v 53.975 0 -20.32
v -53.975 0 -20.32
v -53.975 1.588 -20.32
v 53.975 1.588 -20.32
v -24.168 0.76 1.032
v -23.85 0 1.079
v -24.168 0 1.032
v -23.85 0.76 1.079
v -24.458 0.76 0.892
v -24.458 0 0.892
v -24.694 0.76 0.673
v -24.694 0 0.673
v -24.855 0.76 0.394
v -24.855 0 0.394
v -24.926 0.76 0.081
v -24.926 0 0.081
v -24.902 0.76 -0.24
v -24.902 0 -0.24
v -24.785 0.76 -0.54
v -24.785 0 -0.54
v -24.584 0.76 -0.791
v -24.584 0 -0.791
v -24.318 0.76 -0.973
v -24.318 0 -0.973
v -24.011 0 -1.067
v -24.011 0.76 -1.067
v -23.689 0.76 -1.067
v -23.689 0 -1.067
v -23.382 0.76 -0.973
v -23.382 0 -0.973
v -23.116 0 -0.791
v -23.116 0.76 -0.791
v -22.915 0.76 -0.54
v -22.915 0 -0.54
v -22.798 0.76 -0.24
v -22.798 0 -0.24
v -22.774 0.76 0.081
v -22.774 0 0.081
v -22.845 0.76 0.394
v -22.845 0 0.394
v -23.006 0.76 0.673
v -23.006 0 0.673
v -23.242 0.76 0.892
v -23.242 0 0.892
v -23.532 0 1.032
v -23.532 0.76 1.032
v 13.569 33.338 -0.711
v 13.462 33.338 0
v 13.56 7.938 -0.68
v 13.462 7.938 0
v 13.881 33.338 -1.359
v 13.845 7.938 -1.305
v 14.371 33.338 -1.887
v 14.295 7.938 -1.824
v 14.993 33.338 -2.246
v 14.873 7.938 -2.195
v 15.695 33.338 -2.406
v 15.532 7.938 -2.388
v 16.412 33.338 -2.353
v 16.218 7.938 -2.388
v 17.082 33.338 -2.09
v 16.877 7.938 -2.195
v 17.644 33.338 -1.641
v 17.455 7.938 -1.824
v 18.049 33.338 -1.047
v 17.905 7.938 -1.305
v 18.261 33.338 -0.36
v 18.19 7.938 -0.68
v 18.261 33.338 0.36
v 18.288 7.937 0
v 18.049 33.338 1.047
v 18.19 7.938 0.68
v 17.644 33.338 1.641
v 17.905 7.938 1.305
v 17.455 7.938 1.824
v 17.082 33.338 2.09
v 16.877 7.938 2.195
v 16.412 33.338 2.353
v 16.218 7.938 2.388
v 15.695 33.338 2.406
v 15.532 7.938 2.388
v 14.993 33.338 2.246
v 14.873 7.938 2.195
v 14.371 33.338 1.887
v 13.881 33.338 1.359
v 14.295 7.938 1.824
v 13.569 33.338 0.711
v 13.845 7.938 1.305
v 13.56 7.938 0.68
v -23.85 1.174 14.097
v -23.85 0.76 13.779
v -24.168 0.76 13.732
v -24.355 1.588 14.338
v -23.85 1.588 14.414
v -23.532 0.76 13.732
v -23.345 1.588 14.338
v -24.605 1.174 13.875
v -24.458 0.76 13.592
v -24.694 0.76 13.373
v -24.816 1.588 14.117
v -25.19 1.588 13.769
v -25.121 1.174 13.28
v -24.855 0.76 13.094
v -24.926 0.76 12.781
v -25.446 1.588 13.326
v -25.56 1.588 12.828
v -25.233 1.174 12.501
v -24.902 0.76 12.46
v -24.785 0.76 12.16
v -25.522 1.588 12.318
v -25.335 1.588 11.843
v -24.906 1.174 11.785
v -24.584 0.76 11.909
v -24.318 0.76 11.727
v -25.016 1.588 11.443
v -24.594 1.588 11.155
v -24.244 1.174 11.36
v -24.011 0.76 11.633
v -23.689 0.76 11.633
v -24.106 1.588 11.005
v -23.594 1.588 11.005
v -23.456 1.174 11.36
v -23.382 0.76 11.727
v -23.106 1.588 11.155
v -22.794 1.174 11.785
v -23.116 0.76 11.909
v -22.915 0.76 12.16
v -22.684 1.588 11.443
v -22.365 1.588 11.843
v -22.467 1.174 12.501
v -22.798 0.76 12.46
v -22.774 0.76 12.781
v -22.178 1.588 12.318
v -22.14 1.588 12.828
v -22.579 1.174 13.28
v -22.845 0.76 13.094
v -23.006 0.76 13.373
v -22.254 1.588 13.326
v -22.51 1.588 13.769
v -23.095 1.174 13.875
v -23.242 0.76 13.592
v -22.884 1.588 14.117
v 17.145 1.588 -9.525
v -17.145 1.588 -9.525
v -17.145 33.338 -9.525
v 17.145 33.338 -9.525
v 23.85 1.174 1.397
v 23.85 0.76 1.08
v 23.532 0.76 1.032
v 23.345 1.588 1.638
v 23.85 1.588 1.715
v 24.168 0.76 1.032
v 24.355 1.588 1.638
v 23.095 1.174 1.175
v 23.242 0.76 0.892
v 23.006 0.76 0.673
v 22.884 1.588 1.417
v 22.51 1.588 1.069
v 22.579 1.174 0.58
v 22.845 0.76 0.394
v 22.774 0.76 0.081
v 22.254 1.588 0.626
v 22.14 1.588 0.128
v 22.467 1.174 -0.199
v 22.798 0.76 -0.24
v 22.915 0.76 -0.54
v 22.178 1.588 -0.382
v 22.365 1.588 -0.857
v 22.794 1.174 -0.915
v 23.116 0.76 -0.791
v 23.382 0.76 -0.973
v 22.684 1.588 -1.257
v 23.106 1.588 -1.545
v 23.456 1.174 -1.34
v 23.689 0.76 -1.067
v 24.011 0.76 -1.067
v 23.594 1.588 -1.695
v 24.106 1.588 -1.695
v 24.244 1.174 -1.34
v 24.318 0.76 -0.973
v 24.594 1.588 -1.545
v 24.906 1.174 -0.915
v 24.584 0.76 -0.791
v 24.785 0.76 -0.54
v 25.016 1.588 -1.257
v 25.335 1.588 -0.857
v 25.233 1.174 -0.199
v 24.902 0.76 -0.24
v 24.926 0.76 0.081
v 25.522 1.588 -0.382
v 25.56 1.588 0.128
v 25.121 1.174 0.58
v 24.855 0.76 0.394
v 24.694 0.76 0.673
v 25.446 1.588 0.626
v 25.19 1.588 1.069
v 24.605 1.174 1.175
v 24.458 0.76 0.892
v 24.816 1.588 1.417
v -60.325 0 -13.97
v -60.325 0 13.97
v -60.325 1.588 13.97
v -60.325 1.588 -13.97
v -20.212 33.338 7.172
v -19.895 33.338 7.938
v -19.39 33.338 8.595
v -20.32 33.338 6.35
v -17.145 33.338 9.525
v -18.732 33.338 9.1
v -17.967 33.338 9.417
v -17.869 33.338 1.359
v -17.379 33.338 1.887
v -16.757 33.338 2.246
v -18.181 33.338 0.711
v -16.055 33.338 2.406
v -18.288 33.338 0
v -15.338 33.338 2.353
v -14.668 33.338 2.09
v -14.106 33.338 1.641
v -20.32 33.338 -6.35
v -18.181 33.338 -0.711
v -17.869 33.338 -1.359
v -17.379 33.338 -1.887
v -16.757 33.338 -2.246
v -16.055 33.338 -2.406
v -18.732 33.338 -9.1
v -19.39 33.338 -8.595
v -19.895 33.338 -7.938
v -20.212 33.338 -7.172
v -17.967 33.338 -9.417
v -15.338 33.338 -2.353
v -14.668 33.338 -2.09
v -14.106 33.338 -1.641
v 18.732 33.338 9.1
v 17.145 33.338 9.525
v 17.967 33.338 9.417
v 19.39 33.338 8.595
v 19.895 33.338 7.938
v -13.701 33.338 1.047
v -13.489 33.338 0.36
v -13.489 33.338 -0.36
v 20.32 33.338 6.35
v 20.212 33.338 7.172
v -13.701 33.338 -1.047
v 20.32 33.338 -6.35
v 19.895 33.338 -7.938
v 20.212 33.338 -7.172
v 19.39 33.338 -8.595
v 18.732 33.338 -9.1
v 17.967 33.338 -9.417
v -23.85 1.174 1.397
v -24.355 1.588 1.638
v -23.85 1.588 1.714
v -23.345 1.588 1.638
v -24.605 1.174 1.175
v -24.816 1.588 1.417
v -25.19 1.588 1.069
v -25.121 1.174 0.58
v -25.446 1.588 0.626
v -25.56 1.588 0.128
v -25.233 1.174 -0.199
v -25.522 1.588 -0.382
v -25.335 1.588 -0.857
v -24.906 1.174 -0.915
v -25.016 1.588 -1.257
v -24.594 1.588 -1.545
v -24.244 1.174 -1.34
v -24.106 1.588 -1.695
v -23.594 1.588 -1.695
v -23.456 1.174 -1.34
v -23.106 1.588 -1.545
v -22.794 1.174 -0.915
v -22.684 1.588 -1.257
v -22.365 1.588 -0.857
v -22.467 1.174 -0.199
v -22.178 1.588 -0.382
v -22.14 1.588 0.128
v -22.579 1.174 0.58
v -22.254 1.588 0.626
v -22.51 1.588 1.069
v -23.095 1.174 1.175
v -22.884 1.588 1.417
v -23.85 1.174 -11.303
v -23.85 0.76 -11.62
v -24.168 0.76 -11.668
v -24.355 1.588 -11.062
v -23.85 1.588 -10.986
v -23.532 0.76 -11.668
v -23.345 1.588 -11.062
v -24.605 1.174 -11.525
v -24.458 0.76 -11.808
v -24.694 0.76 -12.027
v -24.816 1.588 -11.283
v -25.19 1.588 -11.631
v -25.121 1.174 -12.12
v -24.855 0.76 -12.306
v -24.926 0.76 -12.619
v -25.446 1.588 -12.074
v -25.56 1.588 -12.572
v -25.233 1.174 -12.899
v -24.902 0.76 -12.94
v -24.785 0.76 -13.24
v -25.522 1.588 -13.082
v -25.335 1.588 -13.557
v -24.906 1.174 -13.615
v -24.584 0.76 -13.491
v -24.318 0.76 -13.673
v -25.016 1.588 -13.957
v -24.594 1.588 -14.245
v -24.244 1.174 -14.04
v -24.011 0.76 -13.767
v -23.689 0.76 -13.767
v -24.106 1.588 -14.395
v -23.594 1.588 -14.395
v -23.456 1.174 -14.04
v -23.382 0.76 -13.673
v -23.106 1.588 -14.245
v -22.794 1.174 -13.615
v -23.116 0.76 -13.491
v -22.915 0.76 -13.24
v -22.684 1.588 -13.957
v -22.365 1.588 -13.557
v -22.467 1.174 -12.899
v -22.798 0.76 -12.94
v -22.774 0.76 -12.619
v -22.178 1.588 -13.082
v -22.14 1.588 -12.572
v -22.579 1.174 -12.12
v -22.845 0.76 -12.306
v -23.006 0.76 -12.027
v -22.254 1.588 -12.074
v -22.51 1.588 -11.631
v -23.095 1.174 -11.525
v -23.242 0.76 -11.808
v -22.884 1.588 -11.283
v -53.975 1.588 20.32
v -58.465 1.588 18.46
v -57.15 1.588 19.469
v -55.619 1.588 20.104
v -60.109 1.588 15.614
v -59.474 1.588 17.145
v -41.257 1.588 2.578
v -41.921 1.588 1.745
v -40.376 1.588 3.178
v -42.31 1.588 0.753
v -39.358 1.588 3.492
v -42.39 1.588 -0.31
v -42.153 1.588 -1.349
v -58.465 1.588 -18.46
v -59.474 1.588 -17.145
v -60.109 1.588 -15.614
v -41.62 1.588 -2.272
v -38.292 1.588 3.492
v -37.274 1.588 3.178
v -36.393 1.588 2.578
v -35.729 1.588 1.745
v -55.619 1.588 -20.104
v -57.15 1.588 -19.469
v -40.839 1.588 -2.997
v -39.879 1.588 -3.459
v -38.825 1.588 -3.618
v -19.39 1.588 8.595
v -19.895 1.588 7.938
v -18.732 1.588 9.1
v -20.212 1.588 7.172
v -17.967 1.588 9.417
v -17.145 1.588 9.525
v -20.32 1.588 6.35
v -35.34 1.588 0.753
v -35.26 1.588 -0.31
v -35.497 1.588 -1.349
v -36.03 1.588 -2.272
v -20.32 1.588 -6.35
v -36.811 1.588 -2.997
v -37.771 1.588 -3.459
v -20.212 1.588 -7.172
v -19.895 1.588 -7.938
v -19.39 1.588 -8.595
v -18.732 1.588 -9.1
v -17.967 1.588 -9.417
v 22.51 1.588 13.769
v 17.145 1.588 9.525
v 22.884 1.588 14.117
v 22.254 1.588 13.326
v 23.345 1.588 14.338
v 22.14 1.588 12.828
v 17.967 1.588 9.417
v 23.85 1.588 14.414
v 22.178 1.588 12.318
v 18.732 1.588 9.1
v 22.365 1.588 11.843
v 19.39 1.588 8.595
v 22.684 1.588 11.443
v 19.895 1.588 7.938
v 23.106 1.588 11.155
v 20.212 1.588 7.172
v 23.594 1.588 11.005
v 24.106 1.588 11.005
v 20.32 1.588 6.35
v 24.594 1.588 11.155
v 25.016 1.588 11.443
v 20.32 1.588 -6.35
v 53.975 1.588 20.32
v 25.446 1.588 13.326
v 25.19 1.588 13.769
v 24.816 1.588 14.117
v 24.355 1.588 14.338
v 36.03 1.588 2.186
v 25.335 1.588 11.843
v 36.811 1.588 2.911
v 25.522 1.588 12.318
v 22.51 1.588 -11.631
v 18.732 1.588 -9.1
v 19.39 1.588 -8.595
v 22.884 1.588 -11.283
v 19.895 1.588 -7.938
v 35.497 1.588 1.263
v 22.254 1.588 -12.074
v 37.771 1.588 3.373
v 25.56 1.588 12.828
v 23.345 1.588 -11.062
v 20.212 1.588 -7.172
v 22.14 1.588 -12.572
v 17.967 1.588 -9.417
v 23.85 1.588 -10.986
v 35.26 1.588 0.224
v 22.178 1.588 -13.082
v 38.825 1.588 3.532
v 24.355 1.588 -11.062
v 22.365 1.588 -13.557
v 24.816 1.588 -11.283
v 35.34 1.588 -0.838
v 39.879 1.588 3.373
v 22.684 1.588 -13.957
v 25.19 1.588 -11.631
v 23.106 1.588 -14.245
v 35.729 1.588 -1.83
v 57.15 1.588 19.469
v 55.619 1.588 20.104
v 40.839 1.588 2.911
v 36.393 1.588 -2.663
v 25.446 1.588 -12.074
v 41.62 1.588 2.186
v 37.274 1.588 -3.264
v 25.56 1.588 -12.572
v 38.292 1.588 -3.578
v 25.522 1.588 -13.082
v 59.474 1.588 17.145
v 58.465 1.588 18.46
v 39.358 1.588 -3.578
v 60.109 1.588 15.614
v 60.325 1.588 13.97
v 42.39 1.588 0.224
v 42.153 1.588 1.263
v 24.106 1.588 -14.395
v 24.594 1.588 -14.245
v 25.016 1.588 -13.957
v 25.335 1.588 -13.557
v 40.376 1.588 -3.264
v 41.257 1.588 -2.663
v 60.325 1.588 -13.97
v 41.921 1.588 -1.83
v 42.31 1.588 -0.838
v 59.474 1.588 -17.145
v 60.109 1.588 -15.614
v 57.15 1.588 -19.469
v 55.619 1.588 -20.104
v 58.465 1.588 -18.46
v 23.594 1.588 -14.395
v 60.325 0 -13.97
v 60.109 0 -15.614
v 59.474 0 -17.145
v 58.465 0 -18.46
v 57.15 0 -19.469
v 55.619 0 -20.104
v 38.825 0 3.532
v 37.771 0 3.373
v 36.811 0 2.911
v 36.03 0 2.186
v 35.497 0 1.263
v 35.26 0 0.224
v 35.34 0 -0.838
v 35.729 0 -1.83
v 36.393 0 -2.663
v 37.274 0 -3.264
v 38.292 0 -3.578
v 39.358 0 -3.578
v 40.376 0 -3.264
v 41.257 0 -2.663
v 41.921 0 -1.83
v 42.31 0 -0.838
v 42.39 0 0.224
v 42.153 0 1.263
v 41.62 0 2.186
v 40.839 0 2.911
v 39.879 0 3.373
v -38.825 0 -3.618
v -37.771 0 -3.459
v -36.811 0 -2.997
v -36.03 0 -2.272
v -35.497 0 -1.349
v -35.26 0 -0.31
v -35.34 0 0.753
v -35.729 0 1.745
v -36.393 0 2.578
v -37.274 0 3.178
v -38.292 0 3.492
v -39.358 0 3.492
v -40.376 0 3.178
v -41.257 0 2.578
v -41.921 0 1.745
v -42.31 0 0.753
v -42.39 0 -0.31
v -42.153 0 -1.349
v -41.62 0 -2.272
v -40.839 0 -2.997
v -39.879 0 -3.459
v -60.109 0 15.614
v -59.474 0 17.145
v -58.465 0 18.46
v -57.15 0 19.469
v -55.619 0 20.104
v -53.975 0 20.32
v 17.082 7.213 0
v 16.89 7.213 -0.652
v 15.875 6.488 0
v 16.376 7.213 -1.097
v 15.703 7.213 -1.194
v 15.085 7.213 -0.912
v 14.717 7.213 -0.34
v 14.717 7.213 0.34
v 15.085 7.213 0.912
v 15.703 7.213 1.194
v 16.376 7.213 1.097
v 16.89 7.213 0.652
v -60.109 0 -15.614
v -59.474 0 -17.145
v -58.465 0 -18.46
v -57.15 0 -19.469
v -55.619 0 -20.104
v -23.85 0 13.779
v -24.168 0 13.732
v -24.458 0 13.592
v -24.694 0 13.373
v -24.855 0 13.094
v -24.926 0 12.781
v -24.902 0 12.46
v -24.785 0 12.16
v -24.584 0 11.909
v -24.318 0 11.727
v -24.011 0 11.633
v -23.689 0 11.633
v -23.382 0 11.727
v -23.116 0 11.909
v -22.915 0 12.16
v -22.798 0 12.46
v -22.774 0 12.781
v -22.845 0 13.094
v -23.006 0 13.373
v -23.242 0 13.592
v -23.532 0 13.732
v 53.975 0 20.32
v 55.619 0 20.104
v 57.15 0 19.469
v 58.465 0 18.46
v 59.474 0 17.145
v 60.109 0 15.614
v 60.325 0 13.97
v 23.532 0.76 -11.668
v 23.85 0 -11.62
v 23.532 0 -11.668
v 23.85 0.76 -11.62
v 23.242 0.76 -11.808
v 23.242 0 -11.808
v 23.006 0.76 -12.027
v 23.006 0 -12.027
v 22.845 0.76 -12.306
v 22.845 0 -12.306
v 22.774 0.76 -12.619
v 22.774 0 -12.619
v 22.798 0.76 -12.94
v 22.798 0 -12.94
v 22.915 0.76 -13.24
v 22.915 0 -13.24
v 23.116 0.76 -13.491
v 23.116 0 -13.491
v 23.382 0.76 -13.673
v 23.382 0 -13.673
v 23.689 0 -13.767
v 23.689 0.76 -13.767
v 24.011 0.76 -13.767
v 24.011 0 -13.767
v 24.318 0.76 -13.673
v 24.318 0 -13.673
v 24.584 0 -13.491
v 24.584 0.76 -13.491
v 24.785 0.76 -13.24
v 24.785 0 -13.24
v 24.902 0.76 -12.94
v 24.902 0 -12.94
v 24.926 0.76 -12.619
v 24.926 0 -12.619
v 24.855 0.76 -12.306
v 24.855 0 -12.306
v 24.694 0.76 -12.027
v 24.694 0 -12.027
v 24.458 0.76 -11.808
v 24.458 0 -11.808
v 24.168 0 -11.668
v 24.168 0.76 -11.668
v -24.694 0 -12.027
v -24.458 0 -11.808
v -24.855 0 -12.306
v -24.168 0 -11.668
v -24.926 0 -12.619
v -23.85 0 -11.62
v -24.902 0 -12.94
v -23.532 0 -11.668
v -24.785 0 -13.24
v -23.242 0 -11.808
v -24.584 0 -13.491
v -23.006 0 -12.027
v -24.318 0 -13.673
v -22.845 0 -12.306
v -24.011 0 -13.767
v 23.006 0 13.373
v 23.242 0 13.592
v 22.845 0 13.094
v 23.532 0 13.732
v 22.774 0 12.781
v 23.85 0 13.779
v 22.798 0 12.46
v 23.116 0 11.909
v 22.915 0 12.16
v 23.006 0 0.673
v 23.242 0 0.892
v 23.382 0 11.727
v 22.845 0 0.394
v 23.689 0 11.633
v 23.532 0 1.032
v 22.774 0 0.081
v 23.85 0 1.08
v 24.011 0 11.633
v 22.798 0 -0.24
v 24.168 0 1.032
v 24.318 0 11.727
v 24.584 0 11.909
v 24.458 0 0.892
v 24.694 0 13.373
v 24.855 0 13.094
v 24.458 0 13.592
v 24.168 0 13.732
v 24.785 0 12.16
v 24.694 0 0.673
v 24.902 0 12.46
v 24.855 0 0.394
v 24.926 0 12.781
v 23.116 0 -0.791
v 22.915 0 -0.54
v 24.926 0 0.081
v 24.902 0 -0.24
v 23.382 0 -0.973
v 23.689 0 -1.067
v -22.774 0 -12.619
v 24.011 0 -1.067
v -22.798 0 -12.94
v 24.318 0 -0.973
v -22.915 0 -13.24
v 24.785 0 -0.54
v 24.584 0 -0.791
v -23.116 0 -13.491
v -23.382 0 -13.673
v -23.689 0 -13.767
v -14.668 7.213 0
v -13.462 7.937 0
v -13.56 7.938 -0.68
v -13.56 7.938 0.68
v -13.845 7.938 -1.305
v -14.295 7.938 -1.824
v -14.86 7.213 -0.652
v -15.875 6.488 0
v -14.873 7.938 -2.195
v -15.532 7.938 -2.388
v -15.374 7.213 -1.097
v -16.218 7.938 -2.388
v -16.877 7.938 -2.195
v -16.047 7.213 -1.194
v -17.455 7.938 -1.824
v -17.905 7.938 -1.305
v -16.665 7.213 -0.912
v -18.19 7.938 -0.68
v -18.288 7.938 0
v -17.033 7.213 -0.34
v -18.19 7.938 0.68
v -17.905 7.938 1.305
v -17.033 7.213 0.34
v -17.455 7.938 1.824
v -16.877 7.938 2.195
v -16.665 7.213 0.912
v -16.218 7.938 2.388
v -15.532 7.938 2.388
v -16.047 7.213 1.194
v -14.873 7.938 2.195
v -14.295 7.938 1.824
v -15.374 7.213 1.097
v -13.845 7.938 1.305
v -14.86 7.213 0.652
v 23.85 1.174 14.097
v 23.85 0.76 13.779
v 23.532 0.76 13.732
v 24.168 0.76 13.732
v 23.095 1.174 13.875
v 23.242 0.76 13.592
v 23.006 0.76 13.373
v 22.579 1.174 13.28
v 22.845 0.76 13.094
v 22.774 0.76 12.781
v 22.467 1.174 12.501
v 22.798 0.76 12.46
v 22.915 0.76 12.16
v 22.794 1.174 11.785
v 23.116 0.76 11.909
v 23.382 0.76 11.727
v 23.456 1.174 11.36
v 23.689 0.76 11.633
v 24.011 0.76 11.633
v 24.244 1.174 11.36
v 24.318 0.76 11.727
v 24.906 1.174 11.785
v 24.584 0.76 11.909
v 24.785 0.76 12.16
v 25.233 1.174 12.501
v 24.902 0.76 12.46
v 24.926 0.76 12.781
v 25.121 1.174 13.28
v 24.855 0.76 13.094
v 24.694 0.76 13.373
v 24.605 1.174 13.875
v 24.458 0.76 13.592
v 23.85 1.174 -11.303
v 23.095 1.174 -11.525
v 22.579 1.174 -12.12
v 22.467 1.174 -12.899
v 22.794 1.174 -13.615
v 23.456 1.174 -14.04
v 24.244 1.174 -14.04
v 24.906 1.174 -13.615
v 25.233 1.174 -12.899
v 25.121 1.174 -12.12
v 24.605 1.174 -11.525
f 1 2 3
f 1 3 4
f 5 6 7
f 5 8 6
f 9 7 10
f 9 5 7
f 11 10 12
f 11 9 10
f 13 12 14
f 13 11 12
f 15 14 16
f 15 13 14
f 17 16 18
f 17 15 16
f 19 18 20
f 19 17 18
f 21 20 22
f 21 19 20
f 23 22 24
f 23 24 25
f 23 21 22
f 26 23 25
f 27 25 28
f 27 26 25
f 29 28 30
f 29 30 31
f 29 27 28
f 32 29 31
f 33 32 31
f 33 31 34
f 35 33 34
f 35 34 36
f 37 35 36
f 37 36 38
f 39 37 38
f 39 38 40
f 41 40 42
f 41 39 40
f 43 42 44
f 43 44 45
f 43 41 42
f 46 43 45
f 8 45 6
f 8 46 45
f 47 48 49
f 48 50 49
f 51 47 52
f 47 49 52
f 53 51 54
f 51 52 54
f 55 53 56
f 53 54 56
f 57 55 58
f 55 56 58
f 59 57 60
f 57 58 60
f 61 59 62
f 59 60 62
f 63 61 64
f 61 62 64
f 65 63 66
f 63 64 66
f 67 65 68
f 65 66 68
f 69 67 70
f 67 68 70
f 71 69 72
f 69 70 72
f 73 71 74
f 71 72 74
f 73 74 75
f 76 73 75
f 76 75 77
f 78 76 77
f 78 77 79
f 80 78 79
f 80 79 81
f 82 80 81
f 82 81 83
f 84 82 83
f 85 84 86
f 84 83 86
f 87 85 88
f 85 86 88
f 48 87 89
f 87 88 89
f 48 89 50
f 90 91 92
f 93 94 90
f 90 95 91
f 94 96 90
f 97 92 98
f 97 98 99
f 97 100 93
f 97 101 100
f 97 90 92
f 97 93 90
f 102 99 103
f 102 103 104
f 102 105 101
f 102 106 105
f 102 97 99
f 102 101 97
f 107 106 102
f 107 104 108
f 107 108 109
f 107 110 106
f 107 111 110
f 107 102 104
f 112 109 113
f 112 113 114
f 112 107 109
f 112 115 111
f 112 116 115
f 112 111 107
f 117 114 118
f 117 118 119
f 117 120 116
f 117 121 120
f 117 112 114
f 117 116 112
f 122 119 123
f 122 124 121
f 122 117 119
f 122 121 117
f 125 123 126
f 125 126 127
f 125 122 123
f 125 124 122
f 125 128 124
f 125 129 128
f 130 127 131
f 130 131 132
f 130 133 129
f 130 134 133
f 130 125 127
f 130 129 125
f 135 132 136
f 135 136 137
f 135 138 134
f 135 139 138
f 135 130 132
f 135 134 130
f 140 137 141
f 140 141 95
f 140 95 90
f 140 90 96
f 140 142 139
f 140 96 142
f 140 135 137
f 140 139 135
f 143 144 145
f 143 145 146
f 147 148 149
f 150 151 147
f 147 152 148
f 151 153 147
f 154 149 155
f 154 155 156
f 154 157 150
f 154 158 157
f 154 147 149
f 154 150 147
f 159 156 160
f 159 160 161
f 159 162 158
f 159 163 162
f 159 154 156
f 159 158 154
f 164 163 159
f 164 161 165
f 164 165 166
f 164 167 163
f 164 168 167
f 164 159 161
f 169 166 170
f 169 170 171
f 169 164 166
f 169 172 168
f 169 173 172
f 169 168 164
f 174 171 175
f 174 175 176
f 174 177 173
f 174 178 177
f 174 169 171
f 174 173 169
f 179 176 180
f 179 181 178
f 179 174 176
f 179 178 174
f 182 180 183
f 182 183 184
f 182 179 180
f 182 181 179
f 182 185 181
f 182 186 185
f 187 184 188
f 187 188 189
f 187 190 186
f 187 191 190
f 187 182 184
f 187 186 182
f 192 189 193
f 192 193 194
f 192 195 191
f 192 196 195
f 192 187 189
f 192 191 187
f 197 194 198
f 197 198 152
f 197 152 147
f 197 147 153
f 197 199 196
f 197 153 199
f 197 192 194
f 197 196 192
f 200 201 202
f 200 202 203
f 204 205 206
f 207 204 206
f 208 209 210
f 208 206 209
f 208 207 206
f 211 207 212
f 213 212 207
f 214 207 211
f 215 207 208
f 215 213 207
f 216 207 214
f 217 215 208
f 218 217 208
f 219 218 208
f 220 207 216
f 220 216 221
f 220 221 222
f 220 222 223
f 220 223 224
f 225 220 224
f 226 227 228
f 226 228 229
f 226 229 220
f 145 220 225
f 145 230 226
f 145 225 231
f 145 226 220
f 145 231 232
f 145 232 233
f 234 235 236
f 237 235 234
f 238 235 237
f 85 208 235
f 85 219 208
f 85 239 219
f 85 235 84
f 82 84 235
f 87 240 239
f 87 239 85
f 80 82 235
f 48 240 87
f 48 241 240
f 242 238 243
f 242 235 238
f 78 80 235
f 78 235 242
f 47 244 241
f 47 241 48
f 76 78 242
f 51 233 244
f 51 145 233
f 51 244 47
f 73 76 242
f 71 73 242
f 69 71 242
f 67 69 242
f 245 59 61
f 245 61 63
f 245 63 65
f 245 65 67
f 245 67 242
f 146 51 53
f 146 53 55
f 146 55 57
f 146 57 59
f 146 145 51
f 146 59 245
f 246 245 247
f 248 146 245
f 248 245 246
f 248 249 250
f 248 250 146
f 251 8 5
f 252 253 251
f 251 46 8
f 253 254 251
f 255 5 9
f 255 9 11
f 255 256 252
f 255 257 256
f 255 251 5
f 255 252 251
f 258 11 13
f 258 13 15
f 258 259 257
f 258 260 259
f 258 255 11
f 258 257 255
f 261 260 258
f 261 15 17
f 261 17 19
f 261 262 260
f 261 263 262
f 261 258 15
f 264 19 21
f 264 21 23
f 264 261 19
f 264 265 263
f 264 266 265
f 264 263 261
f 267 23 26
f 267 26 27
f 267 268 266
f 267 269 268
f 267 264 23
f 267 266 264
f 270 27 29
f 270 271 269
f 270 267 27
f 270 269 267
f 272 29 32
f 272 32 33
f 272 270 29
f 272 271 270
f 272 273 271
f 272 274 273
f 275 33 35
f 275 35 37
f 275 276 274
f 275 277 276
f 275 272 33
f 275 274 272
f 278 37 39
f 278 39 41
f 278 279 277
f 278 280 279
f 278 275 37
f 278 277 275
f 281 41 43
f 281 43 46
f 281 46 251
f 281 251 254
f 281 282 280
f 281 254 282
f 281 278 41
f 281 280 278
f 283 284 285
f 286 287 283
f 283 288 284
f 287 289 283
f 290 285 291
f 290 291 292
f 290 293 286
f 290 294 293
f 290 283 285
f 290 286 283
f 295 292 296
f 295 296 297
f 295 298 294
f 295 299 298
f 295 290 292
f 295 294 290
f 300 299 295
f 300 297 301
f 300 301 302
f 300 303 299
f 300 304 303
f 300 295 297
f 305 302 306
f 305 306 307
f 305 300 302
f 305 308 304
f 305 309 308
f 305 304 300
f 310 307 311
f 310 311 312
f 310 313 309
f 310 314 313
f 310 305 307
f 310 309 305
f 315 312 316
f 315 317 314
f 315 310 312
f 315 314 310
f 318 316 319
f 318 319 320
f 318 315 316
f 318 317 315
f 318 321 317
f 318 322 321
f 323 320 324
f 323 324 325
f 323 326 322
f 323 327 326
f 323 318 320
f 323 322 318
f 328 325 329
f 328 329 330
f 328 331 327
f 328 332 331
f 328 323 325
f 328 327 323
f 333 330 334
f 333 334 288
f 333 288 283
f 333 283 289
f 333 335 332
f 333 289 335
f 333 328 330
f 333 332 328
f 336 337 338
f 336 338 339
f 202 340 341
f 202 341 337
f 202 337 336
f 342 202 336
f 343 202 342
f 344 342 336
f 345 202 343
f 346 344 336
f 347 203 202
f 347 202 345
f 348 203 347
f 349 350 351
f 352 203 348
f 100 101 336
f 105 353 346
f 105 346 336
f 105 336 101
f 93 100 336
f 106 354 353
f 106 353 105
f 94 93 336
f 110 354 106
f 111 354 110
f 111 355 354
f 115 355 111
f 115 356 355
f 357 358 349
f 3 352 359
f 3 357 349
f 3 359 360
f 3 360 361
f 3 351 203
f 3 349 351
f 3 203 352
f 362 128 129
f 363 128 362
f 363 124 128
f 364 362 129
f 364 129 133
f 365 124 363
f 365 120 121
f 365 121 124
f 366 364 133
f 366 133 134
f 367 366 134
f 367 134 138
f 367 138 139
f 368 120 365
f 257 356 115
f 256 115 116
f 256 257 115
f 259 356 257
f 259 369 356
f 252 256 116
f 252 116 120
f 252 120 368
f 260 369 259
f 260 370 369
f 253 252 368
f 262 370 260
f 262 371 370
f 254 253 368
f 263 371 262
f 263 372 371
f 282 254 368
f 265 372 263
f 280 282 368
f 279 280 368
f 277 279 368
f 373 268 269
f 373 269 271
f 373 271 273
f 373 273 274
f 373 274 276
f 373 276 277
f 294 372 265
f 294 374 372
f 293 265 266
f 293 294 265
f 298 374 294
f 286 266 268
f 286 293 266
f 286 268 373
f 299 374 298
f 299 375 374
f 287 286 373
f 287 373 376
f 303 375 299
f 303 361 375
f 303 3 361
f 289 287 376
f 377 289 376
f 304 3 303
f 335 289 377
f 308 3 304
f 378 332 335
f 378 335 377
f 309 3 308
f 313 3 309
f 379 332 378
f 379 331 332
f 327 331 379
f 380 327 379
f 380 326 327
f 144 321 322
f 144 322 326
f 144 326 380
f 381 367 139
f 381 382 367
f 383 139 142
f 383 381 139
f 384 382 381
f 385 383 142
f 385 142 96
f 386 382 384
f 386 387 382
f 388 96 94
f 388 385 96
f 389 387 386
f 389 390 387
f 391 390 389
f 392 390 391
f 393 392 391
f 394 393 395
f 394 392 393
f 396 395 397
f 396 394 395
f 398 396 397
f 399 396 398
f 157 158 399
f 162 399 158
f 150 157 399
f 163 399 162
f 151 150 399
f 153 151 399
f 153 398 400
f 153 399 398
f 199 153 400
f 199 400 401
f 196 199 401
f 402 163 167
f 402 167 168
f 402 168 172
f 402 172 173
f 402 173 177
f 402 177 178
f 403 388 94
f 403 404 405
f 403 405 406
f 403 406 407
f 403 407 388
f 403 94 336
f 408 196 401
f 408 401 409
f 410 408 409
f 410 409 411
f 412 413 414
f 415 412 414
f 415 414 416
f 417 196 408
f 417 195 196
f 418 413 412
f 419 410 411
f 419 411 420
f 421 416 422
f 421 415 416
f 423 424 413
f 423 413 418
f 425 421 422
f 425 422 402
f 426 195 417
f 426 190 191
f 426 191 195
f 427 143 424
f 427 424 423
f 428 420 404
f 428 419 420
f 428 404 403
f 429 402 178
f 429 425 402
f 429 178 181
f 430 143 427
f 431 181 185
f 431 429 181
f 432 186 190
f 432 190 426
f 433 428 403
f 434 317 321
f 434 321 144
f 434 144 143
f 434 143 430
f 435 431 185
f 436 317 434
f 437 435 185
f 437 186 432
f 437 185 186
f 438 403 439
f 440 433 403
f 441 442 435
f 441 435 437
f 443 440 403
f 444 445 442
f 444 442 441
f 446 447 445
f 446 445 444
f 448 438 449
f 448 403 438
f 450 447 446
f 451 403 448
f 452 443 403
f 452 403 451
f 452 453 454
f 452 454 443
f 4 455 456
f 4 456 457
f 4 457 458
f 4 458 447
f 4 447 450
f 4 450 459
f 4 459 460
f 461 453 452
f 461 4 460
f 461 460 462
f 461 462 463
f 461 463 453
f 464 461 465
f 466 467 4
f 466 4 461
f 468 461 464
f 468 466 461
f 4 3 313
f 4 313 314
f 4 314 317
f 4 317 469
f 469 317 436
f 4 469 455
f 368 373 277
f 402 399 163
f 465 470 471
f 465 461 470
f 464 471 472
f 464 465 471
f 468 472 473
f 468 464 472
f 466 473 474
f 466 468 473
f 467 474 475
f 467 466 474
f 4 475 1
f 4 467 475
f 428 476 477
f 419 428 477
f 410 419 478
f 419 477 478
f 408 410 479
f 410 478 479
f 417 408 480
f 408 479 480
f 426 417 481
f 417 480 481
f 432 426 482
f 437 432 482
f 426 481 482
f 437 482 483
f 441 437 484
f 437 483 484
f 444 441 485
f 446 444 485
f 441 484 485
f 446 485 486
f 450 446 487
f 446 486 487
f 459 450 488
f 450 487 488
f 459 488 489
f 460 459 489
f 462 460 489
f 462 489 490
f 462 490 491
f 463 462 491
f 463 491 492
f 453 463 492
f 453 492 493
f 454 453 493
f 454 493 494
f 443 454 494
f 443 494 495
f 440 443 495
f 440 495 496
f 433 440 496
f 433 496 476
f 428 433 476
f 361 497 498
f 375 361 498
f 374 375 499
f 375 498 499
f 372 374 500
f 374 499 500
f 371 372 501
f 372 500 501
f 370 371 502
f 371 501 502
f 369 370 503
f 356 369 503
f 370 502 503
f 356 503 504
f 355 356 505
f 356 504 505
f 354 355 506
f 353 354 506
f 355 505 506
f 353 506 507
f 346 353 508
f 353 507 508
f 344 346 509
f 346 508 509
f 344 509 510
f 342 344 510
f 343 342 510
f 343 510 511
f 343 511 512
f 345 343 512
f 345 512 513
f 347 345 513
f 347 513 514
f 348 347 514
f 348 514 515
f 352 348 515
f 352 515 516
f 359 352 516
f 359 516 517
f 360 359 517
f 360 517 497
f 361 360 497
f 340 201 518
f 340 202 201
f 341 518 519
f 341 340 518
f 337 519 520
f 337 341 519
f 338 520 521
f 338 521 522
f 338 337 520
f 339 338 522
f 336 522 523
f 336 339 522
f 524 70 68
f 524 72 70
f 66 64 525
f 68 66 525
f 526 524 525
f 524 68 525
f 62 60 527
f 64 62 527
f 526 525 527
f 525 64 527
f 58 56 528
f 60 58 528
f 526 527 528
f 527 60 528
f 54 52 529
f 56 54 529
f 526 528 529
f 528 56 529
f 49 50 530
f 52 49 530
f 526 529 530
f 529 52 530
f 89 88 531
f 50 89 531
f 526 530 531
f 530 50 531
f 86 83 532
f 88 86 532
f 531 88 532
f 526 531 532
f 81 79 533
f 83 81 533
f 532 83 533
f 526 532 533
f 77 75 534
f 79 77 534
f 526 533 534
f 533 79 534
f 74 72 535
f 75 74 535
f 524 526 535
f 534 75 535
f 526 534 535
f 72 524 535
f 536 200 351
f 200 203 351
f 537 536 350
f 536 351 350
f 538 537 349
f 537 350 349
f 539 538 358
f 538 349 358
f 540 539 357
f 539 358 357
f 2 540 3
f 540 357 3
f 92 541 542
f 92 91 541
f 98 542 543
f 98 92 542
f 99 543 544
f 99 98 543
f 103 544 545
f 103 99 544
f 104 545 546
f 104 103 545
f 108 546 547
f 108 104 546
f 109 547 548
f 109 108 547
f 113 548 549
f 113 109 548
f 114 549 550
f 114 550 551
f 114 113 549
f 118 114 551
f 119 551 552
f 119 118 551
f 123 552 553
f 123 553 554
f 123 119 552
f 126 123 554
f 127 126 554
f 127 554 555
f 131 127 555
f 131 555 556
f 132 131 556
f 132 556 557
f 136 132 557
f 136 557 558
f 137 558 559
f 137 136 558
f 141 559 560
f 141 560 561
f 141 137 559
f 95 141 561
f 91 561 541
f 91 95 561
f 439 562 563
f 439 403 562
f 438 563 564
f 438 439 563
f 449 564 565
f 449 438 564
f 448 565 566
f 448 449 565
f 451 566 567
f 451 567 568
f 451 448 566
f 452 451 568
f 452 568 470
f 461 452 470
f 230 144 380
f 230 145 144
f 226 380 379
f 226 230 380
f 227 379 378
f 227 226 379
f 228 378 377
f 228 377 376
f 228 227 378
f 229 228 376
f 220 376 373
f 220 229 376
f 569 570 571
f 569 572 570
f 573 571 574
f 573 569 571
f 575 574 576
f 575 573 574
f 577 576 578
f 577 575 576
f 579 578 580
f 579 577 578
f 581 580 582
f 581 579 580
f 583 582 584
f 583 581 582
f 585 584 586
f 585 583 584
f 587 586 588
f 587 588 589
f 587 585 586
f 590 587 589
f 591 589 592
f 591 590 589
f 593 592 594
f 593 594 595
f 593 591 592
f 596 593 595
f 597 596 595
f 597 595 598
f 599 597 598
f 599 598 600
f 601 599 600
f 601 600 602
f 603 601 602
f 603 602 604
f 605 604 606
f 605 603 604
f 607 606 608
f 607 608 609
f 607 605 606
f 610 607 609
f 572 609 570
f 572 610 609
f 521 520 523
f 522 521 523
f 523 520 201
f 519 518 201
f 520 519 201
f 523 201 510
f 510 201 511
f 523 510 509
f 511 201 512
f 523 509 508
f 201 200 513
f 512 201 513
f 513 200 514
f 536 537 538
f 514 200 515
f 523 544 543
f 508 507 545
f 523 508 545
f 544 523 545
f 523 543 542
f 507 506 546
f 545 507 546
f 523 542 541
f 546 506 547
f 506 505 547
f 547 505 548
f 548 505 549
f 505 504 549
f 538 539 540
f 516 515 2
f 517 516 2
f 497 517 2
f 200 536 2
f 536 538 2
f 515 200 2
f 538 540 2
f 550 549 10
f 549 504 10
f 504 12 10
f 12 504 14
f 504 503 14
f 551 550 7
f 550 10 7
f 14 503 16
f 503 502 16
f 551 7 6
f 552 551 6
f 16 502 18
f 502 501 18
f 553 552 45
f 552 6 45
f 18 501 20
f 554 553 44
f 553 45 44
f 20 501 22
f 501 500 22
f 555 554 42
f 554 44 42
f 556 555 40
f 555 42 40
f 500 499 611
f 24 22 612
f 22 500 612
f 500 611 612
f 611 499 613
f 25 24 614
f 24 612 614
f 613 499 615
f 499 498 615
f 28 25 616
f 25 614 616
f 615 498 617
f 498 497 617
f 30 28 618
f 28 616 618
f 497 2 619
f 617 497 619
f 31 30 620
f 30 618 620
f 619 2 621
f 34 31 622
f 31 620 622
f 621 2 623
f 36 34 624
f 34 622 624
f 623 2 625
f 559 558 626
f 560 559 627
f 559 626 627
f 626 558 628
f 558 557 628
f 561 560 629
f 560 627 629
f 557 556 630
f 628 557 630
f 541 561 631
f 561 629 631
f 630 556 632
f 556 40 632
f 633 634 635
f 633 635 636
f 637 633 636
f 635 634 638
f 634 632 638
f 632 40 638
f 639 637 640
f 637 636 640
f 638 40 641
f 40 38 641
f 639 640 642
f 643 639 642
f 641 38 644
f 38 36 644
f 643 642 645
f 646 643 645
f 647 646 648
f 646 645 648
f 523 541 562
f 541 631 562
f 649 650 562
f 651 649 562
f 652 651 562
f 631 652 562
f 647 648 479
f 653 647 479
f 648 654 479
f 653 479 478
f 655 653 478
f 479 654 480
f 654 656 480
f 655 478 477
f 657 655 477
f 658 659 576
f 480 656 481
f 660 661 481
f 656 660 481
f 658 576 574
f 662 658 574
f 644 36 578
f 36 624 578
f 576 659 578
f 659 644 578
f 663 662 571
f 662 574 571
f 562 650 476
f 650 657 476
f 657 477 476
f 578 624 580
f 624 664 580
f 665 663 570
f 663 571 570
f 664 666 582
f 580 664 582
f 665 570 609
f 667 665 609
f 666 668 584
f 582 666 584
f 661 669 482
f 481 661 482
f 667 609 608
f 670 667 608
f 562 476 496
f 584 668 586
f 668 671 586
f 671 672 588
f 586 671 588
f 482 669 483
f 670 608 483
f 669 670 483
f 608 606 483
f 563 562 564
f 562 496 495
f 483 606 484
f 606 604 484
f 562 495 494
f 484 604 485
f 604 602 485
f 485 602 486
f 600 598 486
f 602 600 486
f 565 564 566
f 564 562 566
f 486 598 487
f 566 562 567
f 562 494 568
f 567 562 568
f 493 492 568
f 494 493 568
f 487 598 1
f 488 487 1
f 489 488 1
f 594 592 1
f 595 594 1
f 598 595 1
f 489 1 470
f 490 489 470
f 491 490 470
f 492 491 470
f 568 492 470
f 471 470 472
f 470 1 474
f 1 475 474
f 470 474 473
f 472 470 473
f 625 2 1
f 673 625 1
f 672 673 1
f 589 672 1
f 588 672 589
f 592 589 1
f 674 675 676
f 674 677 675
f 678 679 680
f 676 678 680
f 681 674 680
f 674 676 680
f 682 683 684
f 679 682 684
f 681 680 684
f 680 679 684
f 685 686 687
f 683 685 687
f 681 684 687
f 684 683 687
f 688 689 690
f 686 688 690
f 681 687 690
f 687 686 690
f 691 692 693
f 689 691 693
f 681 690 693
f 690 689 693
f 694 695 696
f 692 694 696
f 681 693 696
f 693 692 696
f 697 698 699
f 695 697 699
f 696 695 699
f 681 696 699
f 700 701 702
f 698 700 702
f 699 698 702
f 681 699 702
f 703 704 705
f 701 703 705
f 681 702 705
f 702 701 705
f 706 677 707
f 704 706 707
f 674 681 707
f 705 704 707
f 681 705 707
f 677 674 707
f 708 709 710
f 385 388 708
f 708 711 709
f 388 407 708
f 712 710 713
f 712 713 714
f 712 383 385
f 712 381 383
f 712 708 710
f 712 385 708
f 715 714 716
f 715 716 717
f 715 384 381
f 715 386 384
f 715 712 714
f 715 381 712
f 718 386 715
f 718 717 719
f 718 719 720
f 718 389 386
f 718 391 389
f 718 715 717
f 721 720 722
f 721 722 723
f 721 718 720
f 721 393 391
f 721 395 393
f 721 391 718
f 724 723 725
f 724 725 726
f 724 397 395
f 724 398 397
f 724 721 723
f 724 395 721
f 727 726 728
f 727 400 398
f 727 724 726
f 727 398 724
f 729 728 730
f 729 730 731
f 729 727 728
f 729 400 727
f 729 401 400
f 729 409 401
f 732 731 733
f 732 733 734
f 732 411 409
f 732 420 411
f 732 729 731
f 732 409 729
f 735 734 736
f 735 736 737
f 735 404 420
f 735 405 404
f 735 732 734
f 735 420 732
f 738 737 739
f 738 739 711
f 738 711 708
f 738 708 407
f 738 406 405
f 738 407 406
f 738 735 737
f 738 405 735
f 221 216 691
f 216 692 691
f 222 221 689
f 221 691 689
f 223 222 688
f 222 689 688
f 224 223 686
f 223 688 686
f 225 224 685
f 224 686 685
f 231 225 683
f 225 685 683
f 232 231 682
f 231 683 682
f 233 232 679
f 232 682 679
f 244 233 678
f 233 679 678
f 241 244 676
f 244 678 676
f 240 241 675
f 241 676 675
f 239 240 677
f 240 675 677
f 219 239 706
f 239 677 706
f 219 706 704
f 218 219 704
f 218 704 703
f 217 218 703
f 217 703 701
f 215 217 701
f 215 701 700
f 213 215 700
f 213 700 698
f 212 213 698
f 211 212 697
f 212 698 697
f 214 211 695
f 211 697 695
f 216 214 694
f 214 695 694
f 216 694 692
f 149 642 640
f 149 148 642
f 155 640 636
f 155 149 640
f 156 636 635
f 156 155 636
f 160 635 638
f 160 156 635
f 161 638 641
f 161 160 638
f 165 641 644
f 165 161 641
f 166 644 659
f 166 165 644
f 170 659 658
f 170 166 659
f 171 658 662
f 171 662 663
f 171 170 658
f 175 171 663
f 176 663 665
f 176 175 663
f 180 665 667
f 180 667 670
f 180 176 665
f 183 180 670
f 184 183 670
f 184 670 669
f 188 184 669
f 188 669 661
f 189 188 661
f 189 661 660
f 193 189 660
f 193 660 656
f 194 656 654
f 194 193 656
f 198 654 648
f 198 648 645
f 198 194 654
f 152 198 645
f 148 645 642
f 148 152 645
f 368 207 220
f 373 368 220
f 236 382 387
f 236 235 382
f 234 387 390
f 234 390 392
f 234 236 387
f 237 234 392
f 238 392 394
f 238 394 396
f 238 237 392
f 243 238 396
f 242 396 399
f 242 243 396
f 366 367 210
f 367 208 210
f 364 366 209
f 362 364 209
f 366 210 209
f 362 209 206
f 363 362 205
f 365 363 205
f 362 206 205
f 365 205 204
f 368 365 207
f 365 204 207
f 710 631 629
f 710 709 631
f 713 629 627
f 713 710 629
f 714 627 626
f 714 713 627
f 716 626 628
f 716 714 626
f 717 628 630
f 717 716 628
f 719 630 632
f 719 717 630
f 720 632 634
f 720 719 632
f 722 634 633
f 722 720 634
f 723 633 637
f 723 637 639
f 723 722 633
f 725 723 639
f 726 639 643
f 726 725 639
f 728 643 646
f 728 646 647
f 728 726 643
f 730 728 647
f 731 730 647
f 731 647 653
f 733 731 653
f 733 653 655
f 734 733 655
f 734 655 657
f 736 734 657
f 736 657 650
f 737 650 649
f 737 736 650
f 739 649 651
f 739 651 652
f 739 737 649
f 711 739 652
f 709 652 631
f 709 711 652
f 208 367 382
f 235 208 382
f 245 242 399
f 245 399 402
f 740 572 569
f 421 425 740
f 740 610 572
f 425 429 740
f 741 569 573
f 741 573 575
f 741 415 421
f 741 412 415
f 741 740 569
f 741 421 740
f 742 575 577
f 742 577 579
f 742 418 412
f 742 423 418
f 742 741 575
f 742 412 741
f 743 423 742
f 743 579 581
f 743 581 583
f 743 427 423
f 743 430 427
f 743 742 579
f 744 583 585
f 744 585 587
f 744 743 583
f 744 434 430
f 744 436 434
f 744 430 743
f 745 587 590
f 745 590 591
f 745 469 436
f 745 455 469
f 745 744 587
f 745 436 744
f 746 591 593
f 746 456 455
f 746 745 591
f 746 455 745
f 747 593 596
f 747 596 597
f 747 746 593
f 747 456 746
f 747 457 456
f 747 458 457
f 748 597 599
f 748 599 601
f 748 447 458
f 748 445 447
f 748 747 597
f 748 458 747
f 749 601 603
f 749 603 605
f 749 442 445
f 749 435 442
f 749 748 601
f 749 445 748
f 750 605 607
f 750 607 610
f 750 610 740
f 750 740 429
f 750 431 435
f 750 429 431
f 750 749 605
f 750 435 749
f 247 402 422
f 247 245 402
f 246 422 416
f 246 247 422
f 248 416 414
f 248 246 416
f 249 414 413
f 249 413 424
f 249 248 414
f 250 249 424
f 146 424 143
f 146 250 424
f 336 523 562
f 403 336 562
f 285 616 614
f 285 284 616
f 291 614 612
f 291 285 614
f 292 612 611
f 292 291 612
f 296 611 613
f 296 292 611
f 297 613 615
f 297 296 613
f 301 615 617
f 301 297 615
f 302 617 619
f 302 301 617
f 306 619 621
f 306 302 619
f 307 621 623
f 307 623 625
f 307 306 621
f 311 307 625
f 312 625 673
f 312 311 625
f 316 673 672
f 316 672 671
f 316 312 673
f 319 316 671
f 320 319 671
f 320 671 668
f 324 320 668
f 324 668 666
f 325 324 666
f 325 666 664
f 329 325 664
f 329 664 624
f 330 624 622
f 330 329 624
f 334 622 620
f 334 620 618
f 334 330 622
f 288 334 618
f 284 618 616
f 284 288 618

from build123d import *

# Parameters (mm, degrees)
SKETCH1_W                      = 120.65
SKETCH1_H                      = 40.64
BOSS_EXTRUDE1_DEPTH            = 1.5875
FILLET1_R                      = 6.35
SKETCH2_W                      = 40.64
SKETCH2_H                      = 19.05
BOSS_EXTRUDE2_DEPTH            = 31.75
FILLET2_R                      = 3.175
F_10_CLEARANCE_HOLE1_D         = 4.826
F_10_CLEARANCE_HOLE1_DEPTH     = 25.4
F_10_CLEARANCE_HOLE1_TIP       = 1.449876674
F_2_CLEARANCE_HOLE1_AT_2_COUNT = 2
F_2_CLEARANCE_HOLE1_AT_2_PITCH = 12.7
F_2_CLEARANCE_HOLE1_AT_3_COUNT = 2
F_2_CLEARANCE_HOLE1_AT_3_PITCH = 25.4
F_2_CLEARANCE_HOLE1_AT_4_COUNT = 2
F_2_CLEARANCE_HOLE1_AT_4_PITCH = 54.041188126
F_2_CLEARANCE_HOLE1_AT_5_COUNT = 2
F_2_CLEARANCE_HOLE1_AT_5_PITCH = 49.361726207
F_2_CLEARANCE_HOLE1_AT_6_COUNT = 2
F_2_CLEARANCE_HOLE1_AT_6_PITCH = 47.700000148
SKETCH13_R                     = 3.5749992
CUT_EXTRUDE1_DEPTH             = 72.856780691


with BuildPart() as part:
    # Sketch1 → Boss-Extrude1 (new body)
    with BuildSketch(Plane(origin=(0, 0, 0), x_dir=(1, 0, 0), z_dir=(0, 1, 0))):
        Rectangle(SKETCH1_W, SKETCH1_H)
    extrude(amount=BOSS_EXTRUDE1_DEPTH)

    # Fillet1
    fillet1_edges = [part.edges().sort_by_distance(p)[0] for p in [
        (60.325, 0.79375, 20.32),
        (-60.325, 0.79375, 20.32),
        (-60.325, 0.79375, -20.32),
        (60.325, 0.79375, -20.32),
    ]]
    fillet(fillet1_edges, radius=FILLET1_R)

    # Sketch2 → Boss-Extrude2 (add)
    with BuildSketch(Plane(origin=(0, 1.5875, 0), x_dir=(1, 0, 0), z_dir=(0, 1, 0))):
        Rectangle(SKETCH2_W, SKETCH2_H)
    extrude(amount=BOSS_EXTRUDE2_DEPTH)

    # Fillet2
    fillet2_edges = [part.edges().sort_by_distance(p)[0] for p in [
        (20.32, 17.4625, 9.525),
        (20.32, 17.4625, -9.525),
        (-20.32, 17.4625, -9.525),
        (-20.32, 17.4625, 9.525),
    ]]
    fillet(fillet2_edges, radius=FILLET2_R)

    # #10 Clearance Hole1
    with Locations(Plane(origin=(0, 33.3375, 0), x_dir=(1, 0, 0), z_dir=(0, 1, 0))):
        with Locations((-15.875, 0), (15.875, 0)):
            Hole(F_10_CLEARANCE_HOLE1_D / 2, depth=F_10_CLEARANCE_HOLE1_DEPTH)
            with Locations((0, 0, -(F_10_CLEARANCE_HOLE1_DEPTH + F_10_CLEARANCE_HOLE1_TIP / 2))):  # 118° drill point
                Cone(0, F_10_CLEARANCE_HOLE1_D / 2, F_10_CLEARANCE_HOLE1_TIP, mode=Mode.SUBTRACT)

    # Sketch12 → #2 Clearance Hole1 (revolve, cut)
    with BuildSketch(Plane(origin=(-23.850000074, 1.5875, -12.7), x_dir=(0, 0, 1), z_dir=(1, 0, 0))):
        Polygon((0, 0), (0, 1.5875), (1.0795, 1.5875), (1.0795, 0.827548112), (1.7145, 0), align=None)
    f_2_clearance_hole1 = revolve(axis=Axis((-23.850000074, 7.9375, -12.7), (0, -1, 0)), mode=Mode.SUBTRACT)

    # #2 Clearance Hole1 at 2: #2 Clearance Hole1 ×2
    with Locations(*[(0, 0, i * F_2_CLEARANCE_HOLE1_AT_2_PITCH) for i in range(1, F_2_CLEARANCE_HOLE1_AT_2_COUNT)]):
        add(f_2_clearance_hole1, mode=Mode.SUBTRACT)

    # #2 Clearance Hole1 at 3: #2 Clearance Hole1 ×2
    with Locations(*[(0, 0, i * F_2_CLEARANCE_HOLE1_AT_3_PITCH) for i in range(1, F_2_CLEARANCE_HOLE1_AT_3_COUNT)]):
        add(f_2_clearance_hole1, mode=Mode.SUBTRACT)

    # #2 Clearance Hole1 at 4: #2 Clearance Hole1 ×2
    with Locations(*[Vector(0.8826600931937462, 0, 0.4700118720662355) * (i * F_2_CLEARANCE_HOLE1_AT_4_PITCH) for i in range(1, F_2_CLEARANCE_HOLE1_AT_4_COUNT)]):
        add(f_2_clearance_hole1, mode=Mode.SUBTRACT)

    # #2 Clearance Hole1 at 5: #2 Clearance Hole1 ×2
    with Locations(*[Vector(0.9663357385056085, 0, 0.2572843572524773) * (i * F_2_CLEARANCE_HOLE1_AT_5_PITCH) for i in range(1, F_2_CLEARANCE_HOLE1_AT_5_COUNT)]):
        add(f_2_clearance_hole1, mode=Mode.SUBTRACT)

    # #2 Clearance Hole1 at 6: #2 Clearance Hole1 ×2
    with Locations(*[(i * F_2_CLEARANCE_HOLE1_AT_6_PITCH, 0, 0) for i in range(1, F_2_CLEARANCE_HOLE1_AT_6_COUNT)]):
        add(f_2_clearance_hole1, mode=Mode.SUBTRACT)

    # Sketch13 → Cut-Extrude1 (cut, through all)
    with BuildSketch(Plane(origin=(0, 0, 0), x_dir=(-1, 0, 0), z_dir=(0, -1, 0))):
        with Locations(Location((38.825000074, 0.042792778, 0), (0, 0, 90))):
            Circle(SKETCH13_R)
        with Locations(Location((-38.825000074, 0.042792778, 0), (0, 0, 270))):
            Circle(SKETCH13_R)
    extrude(amount=-CUT_EXTRUDE1_DEPTH, mode=Mode.SUBTRACT)


solid = part.part
